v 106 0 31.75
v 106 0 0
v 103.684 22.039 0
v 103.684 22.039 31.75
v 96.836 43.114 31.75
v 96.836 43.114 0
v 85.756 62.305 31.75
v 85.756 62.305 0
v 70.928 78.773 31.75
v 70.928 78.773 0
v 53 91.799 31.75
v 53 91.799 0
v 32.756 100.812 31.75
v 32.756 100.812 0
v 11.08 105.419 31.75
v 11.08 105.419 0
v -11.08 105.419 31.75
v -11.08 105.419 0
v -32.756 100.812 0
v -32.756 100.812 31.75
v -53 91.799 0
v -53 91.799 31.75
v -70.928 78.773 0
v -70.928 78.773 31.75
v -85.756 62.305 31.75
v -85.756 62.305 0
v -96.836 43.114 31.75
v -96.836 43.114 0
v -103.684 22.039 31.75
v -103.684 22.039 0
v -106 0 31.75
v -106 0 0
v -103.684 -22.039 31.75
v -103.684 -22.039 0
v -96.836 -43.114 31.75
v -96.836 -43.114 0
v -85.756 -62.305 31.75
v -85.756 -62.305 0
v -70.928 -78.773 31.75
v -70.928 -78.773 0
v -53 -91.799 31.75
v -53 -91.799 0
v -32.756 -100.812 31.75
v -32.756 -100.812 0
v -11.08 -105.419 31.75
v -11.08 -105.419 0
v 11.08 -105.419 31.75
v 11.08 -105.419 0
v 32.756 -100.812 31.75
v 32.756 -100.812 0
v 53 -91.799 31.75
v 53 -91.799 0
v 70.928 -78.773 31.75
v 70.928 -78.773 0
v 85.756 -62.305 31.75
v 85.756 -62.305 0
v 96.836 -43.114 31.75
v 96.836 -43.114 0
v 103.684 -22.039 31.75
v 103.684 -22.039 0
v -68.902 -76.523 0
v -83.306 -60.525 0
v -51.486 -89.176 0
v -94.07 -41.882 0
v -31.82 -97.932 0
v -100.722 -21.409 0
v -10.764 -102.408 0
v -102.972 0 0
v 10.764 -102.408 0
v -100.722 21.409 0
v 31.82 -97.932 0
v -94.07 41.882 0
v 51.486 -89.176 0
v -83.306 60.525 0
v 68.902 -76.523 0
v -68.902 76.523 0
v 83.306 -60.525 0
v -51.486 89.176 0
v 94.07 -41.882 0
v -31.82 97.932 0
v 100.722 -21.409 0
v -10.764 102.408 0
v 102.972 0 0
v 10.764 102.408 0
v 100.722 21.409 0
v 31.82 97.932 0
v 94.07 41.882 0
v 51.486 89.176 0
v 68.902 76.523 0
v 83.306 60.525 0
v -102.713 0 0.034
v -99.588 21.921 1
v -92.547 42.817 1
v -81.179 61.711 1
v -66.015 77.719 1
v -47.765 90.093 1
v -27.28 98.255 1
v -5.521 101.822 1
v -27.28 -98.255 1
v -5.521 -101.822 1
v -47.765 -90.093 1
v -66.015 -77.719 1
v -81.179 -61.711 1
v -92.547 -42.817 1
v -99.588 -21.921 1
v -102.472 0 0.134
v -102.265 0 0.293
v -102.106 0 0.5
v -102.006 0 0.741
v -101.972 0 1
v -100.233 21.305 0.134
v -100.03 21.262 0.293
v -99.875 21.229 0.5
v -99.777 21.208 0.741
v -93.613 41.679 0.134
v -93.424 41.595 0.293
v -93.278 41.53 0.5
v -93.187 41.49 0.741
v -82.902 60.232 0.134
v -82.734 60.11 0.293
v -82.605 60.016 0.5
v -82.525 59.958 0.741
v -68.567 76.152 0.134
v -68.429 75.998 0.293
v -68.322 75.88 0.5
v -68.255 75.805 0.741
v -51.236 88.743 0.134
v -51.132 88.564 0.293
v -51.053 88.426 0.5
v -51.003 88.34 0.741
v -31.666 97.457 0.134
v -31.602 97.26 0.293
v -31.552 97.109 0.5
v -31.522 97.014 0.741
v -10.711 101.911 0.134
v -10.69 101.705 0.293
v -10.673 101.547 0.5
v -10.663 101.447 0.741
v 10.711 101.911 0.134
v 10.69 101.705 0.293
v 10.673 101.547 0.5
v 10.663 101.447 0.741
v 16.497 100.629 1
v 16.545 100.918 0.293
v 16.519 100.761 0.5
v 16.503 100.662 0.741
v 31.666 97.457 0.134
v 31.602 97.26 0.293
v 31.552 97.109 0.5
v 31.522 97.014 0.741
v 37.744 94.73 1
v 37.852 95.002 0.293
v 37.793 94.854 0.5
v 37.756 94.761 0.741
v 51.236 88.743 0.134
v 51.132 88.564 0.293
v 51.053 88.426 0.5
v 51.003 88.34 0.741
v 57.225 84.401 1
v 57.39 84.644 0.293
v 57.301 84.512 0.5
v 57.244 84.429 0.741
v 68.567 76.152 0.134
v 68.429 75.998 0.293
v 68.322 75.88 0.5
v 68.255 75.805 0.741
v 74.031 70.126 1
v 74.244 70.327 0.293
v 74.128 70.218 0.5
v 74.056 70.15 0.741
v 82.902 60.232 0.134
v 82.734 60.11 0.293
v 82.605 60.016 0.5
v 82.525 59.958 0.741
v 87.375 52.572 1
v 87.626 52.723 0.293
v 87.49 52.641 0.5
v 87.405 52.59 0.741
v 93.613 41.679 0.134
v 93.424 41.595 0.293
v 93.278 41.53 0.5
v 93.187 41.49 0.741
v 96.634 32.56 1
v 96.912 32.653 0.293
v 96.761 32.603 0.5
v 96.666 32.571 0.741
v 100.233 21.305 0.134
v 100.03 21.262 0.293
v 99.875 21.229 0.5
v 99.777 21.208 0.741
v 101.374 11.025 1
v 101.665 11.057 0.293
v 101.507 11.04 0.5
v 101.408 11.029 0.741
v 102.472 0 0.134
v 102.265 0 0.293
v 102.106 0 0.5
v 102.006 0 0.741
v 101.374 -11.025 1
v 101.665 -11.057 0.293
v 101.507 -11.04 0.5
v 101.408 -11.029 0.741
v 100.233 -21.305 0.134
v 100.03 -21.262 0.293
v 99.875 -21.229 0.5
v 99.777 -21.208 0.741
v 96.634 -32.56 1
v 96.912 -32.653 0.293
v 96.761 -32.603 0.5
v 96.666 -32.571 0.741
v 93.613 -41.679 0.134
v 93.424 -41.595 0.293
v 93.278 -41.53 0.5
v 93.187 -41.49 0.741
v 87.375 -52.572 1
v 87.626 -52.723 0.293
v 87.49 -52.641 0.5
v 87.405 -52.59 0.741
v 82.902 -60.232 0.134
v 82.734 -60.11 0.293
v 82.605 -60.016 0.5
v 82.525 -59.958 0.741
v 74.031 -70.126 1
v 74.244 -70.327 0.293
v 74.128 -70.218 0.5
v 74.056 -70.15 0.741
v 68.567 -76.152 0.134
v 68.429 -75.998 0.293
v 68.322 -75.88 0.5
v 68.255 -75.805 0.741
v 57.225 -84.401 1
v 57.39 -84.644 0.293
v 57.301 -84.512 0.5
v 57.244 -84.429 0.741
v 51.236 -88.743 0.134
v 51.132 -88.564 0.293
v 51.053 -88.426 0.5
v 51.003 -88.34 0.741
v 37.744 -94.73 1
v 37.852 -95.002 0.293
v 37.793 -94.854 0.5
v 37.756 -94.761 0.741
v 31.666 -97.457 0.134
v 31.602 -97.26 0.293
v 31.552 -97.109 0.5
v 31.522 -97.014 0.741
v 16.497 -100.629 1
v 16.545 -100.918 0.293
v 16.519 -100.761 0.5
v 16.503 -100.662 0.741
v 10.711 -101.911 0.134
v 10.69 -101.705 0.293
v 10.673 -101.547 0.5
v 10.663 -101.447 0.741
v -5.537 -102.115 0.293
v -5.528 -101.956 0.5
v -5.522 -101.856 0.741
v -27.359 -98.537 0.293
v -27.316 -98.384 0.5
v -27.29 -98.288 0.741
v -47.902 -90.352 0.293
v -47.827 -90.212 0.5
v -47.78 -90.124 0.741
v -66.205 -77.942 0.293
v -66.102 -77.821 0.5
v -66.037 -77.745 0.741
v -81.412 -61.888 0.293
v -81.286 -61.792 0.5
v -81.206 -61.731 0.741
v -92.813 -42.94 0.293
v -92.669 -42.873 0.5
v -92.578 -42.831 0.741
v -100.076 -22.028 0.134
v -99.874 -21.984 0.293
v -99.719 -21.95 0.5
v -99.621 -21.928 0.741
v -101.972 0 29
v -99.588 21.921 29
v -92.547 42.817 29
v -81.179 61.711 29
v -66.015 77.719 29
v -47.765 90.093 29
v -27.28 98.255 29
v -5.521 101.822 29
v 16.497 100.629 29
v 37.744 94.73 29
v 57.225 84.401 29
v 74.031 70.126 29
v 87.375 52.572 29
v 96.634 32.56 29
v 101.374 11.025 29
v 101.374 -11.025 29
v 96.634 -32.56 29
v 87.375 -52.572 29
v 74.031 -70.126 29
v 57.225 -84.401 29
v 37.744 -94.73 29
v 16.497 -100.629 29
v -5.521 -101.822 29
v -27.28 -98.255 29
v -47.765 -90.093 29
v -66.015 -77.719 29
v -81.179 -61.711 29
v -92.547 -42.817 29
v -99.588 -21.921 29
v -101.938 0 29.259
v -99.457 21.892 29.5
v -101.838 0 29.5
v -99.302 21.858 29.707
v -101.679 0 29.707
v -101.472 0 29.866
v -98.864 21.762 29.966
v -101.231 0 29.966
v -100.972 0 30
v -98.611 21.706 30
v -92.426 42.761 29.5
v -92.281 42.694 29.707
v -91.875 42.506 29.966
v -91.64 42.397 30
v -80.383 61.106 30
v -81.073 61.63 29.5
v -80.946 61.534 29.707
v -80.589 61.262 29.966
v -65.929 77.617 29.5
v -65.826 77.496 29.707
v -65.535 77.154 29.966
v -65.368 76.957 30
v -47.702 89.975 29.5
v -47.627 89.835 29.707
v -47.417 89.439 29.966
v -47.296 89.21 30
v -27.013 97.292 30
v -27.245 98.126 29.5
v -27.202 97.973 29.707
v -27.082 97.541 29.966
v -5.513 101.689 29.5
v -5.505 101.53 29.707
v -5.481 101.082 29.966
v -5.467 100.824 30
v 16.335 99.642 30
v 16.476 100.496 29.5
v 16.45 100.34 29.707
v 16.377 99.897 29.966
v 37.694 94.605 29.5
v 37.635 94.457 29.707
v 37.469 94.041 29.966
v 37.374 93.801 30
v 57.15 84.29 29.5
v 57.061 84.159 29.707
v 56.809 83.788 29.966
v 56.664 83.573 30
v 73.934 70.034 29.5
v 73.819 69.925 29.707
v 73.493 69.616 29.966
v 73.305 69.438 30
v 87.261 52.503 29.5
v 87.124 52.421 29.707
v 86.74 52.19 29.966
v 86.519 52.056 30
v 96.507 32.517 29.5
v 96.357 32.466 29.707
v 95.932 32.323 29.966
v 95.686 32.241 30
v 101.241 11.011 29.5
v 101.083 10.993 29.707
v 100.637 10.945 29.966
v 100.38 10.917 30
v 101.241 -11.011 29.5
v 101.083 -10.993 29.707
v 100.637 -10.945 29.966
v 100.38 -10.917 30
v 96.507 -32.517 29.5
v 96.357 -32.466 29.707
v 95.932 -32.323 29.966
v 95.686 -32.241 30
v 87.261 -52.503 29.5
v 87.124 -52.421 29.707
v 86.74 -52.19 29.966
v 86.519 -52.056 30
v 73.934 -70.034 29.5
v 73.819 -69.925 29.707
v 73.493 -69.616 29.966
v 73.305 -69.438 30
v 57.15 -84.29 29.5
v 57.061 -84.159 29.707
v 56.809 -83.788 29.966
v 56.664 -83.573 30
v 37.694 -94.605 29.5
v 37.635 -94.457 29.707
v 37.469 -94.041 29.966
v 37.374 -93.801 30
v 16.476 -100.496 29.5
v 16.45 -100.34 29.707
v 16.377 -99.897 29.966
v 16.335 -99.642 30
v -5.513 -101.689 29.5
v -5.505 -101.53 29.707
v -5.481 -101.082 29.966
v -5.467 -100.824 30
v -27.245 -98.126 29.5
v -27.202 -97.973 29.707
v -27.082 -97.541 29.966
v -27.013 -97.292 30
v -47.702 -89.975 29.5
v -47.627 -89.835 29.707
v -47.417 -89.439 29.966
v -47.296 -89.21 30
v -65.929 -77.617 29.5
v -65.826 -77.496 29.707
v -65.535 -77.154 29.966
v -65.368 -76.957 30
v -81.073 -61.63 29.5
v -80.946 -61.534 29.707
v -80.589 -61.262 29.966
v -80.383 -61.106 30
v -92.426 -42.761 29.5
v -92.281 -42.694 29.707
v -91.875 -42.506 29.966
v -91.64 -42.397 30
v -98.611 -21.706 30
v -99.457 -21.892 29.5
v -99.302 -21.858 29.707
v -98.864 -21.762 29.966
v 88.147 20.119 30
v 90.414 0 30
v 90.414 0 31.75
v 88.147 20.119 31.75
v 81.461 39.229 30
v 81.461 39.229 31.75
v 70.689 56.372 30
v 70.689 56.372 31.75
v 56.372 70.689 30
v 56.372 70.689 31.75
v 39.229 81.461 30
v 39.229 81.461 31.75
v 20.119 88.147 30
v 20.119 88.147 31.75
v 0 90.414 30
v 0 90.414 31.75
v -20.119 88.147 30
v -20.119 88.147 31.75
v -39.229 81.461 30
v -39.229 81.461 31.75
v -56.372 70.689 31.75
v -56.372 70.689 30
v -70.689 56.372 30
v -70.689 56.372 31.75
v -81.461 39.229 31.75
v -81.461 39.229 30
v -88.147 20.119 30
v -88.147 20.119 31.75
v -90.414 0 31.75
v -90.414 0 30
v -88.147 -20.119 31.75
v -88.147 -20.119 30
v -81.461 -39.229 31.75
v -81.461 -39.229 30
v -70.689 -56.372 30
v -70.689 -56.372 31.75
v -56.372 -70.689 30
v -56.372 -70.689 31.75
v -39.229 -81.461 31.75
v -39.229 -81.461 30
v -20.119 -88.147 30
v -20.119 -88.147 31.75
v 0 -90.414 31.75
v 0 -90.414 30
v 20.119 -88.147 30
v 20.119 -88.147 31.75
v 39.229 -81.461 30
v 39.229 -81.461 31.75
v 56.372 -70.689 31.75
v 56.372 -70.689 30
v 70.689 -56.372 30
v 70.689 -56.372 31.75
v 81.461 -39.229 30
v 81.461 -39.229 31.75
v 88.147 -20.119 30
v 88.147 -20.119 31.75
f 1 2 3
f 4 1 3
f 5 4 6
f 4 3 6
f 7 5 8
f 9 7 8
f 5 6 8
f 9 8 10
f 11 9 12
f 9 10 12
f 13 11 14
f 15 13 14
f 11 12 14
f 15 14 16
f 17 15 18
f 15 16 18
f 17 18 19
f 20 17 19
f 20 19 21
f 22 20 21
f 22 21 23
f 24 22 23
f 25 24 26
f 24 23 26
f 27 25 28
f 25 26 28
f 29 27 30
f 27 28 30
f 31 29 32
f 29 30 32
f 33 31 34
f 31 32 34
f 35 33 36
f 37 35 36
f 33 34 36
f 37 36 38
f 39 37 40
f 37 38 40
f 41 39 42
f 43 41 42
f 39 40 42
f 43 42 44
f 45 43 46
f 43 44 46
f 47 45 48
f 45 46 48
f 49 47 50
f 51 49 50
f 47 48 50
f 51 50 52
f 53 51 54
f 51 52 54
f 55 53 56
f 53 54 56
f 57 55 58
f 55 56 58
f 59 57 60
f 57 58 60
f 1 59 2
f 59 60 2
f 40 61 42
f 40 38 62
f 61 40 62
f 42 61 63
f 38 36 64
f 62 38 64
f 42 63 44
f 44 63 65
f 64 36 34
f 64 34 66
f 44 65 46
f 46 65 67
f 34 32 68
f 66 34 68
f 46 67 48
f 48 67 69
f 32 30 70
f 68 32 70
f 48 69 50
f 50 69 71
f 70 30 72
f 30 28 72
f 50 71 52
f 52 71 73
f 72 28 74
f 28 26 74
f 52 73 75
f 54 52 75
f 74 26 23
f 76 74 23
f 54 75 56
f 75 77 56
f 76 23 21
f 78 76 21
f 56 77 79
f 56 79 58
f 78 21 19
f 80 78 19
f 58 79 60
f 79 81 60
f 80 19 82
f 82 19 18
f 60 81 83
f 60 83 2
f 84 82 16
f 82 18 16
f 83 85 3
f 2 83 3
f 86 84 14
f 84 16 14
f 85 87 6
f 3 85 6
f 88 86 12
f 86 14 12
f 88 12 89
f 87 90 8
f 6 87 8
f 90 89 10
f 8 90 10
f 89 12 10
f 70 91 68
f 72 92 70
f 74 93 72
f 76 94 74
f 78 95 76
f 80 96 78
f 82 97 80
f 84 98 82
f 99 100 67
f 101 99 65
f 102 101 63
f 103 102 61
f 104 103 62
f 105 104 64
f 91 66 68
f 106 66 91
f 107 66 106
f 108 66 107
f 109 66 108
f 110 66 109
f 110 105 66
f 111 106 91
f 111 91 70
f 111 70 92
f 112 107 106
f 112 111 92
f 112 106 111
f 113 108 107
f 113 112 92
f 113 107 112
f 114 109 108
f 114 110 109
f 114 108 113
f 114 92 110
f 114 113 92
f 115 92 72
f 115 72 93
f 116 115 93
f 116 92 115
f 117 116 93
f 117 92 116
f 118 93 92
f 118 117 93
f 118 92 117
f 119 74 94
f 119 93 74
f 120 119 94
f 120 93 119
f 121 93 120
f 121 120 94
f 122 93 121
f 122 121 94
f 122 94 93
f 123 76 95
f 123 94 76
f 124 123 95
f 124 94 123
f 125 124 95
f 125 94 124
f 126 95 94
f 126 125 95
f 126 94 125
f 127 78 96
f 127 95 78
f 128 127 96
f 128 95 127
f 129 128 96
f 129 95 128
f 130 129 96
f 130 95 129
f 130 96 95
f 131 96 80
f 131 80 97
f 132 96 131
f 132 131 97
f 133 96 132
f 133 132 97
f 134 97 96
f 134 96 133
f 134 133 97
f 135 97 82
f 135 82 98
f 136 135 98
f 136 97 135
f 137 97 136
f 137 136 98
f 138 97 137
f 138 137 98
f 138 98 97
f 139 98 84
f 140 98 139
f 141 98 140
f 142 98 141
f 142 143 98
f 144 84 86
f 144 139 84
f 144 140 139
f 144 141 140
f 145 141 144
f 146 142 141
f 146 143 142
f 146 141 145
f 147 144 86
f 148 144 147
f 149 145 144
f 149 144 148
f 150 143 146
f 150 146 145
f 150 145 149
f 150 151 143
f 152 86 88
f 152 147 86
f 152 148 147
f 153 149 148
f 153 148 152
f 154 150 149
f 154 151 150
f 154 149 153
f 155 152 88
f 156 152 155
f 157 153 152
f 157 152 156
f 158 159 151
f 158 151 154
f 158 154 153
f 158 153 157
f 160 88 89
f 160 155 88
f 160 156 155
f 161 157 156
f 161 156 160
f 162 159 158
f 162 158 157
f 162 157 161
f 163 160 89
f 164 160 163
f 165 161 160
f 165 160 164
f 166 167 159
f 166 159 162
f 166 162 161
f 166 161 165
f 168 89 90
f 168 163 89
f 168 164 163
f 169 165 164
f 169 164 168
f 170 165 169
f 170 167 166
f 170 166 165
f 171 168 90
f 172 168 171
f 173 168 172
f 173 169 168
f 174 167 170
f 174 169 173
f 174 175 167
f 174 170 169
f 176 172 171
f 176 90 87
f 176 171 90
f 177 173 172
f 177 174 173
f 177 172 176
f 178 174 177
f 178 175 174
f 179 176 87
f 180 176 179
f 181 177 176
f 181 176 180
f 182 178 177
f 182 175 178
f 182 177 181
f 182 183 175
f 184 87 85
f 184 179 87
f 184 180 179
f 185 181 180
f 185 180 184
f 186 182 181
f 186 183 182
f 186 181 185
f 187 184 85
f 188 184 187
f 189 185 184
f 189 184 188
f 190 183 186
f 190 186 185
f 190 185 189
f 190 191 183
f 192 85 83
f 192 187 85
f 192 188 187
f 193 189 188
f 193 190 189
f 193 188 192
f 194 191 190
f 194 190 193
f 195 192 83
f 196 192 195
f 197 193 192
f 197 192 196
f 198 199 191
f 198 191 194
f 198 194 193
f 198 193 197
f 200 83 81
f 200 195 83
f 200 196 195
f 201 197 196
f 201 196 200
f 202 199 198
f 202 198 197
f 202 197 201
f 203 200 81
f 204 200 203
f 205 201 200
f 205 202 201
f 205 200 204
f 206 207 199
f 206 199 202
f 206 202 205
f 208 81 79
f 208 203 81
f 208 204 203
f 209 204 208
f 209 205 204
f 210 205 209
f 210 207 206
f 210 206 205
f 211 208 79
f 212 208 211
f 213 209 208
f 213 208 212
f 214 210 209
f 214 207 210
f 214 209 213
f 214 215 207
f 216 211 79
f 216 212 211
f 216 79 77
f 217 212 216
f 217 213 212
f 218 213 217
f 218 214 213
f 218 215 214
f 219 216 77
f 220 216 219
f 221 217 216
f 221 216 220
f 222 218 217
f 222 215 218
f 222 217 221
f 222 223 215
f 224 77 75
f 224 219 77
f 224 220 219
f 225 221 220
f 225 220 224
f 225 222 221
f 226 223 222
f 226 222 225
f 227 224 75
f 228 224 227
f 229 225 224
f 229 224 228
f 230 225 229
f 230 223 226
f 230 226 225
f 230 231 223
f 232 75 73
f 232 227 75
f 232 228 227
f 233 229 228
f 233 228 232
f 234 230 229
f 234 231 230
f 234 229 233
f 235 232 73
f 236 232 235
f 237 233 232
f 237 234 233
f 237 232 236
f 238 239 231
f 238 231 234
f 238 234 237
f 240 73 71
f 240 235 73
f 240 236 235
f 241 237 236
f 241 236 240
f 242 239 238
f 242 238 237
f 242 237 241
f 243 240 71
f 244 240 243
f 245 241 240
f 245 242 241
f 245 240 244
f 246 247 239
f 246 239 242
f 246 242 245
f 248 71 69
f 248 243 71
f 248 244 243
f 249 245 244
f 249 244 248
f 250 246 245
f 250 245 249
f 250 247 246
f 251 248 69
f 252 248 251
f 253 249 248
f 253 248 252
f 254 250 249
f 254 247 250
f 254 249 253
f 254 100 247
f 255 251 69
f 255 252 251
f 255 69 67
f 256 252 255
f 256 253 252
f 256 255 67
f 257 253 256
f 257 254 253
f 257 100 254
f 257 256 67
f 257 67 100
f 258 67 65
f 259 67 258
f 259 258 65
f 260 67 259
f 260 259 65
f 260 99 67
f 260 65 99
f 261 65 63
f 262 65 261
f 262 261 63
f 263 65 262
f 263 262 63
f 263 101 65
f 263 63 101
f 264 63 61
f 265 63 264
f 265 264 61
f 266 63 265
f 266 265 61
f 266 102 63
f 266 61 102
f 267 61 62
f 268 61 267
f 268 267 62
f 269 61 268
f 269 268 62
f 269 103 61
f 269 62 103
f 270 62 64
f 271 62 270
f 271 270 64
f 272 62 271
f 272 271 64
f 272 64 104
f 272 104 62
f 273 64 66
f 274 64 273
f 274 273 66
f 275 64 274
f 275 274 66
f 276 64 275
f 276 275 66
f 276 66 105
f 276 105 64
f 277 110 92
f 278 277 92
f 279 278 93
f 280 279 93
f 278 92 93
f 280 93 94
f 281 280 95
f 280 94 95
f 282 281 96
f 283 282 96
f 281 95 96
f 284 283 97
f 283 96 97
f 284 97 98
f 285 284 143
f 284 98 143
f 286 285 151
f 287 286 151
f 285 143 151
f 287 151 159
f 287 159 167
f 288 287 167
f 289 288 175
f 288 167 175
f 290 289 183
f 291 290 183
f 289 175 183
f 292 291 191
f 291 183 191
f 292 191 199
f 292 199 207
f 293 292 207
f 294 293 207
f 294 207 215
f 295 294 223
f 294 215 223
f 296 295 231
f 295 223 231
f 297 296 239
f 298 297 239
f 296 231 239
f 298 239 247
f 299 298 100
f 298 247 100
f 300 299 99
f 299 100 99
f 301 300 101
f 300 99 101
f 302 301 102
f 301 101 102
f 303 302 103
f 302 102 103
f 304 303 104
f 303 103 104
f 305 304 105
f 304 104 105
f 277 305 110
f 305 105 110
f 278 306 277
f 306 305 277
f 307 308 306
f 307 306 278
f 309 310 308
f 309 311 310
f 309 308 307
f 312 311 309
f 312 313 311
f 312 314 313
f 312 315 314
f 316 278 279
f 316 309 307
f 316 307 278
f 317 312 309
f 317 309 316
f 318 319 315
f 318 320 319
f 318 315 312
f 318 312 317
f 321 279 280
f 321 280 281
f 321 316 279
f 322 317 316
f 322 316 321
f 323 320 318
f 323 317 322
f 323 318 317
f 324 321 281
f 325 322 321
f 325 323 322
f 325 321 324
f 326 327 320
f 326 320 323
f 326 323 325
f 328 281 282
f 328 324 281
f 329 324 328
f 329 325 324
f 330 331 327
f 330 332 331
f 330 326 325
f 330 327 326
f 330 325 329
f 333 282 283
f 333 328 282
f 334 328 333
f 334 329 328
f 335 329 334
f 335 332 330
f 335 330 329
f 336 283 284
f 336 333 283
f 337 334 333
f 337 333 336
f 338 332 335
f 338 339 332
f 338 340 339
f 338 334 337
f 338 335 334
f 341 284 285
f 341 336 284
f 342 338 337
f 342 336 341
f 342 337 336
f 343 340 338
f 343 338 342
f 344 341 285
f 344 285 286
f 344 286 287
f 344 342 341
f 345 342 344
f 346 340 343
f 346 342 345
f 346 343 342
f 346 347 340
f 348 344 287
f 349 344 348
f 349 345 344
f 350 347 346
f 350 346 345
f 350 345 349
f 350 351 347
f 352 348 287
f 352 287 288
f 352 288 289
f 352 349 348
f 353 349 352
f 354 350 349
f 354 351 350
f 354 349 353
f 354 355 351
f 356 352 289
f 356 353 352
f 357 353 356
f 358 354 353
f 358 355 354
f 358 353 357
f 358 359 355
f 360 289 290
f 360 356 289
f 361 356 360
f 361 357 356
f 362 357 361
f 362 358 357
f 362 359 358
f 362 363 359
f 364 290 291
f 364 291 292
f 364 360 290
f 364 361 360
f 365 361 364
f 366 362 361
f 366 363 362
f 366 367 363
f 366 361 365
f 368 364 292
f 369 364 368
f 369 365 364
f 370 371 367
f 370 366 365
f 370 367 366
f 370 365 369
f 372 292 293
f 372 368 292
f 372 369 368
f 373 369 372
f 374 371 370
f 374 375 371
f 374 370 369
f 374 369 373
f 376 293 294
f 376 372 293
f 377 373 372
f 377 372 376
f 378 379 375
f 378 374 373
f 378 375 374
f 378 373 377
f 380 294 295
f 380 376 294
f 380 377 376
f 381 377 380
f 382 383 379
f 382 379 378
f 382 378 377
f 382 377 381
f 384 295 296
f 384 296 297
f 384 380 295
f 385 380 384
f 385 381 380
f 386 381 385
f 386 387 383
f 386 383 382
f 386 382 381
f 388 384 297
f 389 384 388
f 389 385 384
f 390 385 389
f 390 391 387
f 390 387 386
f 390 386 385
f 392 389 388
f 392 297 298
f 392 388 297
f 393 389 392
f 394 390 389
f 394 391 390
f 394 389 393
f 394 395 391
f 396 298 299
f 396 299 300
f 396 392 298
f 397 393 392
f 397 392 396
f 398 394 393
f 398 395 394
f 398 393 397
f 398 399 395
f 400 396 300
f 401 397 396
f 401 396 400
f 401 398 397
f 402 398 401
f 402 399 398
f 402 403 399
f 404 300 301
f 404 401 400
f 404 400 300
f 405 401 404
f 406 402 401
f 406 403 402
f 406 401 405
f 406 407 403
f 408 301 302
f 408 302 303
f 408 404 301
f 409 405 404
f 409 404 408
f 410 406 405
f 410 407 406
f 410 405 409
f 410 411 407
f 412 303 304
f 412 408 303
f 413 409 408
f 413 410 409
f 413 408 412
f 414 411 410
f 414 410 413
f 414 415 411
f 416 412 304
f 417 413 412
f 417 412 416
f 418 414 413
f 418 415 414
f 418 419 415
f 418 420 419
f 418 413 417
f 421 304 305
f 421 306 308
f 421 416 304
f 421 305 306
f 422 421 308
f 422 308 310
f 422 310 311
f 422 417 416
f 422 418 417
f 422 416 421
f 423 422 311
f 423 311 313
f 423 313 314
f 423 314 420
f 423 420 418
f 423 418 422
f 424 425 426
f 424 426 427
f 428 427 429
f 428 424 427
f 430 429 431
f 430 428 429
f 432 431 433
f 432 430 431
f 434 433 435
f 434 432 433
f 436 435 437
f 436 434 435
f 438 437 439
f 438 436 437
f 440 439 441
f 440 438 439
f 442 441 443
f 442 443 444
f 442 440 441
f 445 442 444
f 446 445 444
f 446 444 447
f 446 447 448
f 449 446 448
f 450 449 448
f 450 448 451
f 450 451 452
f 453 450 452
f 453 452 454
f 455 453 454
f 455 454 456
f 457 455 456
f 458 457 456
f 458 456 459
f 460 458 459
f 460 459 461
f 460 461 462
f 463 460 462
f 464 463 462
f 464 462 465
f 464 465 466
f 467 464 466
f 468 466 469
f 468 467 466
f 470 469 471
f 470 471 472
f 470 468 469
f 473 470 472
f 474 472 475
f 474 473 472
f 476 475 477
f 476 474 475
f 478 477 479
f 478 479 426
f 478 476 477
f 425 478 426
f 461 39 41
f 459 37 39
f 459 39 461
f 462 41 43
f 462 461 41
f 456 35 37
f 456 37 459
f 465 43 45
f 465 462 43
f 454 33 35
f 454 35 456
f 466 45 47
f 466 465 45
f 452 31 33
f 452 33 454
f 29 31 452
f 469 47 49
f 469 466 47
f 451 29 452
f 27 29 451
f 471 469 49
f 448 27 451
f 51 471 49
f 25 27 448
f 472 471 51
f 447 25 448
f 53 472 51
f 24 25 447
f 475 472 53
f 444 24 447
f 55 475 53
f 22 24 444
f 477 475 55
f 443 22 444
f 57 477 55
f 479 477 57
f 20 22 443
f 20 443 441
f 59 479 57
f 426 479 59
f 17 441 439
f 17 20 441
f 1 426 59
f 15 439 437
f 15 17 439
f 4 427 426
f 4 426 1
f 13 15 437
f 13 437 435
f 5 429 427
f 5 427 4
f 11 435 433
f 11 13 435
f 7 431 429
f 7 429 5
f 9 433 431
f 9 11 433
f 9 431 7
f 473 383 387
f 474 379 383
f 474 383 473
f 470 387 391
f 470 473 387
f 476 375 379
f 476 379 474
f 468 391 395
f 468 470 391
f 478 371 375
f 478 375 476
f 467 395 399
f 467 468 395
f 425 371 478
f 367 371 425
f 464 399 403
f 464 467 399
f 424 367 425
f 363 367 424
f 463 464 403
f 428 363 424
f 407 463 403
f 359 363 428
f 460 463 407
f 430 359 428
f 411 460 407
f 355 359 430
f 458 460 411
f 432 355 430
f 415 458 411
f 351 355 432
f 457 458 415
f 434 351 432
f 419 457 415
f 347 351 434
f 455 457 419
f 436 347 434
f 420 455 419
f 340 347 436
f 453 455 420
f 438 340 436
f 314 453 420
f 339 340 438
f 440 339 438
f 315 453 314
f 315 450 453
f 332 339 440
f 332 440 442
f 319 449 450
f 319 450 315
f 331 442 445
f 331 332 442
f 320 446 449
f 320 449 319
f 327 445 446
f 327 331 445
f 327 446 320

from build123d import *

# Parameters (mm, degrees)
BASEPLATE_R         = 106
BASEPLATE_R_2       = 90.414349638
BOSS_EXTRUDE1_DEPTH = 31.75
SKETCH2_R           = 101.971973166
CUT_EXTRUDE1_DEPTH  = 30
FILLET1_R           = 1
FILLET2_R           = 1


with BuildPart() as part:
    # Baseplate → Boss-Extrude1 (new body)
    with BuildSketch(Plane.XY):
        Circle(BASEPLATE_R)
        Circle(BASEPLATE_R_2, mode=Mode.SUBTRACT)
    extrude(amount=BOSS_EXTRUDE1_DEPTH)

    # Sketch2 → Cut-Extrude1 (cut)
    with BuildSketch(Plane(origin=(0, 0, 0), x_dir=(-1, 0, 0), z_dir=(0, 0, -1))):
        Circle(SKETCH2_R)
    extrude(amount=-CUT_EXTRUDE1_DEPTH, mode=Mode.SUBTRACT)

    # Fillet1
    fillet1_edges = [part.edges().sort_by_distance(p)[0] for p in [
        (101.971973166, 0, 0),
    ]]
    fillet(fillet1_edges, radius=FILLET1_R)

    # Fillet2
    fillet2_edges = [part.edges().sort_by_distance(p)[0] for p in [
        (101.971973166, 0, 30),
    ]]
    fillet(fillet2_edges, radius=FILLET2_R)


solid = part.part
